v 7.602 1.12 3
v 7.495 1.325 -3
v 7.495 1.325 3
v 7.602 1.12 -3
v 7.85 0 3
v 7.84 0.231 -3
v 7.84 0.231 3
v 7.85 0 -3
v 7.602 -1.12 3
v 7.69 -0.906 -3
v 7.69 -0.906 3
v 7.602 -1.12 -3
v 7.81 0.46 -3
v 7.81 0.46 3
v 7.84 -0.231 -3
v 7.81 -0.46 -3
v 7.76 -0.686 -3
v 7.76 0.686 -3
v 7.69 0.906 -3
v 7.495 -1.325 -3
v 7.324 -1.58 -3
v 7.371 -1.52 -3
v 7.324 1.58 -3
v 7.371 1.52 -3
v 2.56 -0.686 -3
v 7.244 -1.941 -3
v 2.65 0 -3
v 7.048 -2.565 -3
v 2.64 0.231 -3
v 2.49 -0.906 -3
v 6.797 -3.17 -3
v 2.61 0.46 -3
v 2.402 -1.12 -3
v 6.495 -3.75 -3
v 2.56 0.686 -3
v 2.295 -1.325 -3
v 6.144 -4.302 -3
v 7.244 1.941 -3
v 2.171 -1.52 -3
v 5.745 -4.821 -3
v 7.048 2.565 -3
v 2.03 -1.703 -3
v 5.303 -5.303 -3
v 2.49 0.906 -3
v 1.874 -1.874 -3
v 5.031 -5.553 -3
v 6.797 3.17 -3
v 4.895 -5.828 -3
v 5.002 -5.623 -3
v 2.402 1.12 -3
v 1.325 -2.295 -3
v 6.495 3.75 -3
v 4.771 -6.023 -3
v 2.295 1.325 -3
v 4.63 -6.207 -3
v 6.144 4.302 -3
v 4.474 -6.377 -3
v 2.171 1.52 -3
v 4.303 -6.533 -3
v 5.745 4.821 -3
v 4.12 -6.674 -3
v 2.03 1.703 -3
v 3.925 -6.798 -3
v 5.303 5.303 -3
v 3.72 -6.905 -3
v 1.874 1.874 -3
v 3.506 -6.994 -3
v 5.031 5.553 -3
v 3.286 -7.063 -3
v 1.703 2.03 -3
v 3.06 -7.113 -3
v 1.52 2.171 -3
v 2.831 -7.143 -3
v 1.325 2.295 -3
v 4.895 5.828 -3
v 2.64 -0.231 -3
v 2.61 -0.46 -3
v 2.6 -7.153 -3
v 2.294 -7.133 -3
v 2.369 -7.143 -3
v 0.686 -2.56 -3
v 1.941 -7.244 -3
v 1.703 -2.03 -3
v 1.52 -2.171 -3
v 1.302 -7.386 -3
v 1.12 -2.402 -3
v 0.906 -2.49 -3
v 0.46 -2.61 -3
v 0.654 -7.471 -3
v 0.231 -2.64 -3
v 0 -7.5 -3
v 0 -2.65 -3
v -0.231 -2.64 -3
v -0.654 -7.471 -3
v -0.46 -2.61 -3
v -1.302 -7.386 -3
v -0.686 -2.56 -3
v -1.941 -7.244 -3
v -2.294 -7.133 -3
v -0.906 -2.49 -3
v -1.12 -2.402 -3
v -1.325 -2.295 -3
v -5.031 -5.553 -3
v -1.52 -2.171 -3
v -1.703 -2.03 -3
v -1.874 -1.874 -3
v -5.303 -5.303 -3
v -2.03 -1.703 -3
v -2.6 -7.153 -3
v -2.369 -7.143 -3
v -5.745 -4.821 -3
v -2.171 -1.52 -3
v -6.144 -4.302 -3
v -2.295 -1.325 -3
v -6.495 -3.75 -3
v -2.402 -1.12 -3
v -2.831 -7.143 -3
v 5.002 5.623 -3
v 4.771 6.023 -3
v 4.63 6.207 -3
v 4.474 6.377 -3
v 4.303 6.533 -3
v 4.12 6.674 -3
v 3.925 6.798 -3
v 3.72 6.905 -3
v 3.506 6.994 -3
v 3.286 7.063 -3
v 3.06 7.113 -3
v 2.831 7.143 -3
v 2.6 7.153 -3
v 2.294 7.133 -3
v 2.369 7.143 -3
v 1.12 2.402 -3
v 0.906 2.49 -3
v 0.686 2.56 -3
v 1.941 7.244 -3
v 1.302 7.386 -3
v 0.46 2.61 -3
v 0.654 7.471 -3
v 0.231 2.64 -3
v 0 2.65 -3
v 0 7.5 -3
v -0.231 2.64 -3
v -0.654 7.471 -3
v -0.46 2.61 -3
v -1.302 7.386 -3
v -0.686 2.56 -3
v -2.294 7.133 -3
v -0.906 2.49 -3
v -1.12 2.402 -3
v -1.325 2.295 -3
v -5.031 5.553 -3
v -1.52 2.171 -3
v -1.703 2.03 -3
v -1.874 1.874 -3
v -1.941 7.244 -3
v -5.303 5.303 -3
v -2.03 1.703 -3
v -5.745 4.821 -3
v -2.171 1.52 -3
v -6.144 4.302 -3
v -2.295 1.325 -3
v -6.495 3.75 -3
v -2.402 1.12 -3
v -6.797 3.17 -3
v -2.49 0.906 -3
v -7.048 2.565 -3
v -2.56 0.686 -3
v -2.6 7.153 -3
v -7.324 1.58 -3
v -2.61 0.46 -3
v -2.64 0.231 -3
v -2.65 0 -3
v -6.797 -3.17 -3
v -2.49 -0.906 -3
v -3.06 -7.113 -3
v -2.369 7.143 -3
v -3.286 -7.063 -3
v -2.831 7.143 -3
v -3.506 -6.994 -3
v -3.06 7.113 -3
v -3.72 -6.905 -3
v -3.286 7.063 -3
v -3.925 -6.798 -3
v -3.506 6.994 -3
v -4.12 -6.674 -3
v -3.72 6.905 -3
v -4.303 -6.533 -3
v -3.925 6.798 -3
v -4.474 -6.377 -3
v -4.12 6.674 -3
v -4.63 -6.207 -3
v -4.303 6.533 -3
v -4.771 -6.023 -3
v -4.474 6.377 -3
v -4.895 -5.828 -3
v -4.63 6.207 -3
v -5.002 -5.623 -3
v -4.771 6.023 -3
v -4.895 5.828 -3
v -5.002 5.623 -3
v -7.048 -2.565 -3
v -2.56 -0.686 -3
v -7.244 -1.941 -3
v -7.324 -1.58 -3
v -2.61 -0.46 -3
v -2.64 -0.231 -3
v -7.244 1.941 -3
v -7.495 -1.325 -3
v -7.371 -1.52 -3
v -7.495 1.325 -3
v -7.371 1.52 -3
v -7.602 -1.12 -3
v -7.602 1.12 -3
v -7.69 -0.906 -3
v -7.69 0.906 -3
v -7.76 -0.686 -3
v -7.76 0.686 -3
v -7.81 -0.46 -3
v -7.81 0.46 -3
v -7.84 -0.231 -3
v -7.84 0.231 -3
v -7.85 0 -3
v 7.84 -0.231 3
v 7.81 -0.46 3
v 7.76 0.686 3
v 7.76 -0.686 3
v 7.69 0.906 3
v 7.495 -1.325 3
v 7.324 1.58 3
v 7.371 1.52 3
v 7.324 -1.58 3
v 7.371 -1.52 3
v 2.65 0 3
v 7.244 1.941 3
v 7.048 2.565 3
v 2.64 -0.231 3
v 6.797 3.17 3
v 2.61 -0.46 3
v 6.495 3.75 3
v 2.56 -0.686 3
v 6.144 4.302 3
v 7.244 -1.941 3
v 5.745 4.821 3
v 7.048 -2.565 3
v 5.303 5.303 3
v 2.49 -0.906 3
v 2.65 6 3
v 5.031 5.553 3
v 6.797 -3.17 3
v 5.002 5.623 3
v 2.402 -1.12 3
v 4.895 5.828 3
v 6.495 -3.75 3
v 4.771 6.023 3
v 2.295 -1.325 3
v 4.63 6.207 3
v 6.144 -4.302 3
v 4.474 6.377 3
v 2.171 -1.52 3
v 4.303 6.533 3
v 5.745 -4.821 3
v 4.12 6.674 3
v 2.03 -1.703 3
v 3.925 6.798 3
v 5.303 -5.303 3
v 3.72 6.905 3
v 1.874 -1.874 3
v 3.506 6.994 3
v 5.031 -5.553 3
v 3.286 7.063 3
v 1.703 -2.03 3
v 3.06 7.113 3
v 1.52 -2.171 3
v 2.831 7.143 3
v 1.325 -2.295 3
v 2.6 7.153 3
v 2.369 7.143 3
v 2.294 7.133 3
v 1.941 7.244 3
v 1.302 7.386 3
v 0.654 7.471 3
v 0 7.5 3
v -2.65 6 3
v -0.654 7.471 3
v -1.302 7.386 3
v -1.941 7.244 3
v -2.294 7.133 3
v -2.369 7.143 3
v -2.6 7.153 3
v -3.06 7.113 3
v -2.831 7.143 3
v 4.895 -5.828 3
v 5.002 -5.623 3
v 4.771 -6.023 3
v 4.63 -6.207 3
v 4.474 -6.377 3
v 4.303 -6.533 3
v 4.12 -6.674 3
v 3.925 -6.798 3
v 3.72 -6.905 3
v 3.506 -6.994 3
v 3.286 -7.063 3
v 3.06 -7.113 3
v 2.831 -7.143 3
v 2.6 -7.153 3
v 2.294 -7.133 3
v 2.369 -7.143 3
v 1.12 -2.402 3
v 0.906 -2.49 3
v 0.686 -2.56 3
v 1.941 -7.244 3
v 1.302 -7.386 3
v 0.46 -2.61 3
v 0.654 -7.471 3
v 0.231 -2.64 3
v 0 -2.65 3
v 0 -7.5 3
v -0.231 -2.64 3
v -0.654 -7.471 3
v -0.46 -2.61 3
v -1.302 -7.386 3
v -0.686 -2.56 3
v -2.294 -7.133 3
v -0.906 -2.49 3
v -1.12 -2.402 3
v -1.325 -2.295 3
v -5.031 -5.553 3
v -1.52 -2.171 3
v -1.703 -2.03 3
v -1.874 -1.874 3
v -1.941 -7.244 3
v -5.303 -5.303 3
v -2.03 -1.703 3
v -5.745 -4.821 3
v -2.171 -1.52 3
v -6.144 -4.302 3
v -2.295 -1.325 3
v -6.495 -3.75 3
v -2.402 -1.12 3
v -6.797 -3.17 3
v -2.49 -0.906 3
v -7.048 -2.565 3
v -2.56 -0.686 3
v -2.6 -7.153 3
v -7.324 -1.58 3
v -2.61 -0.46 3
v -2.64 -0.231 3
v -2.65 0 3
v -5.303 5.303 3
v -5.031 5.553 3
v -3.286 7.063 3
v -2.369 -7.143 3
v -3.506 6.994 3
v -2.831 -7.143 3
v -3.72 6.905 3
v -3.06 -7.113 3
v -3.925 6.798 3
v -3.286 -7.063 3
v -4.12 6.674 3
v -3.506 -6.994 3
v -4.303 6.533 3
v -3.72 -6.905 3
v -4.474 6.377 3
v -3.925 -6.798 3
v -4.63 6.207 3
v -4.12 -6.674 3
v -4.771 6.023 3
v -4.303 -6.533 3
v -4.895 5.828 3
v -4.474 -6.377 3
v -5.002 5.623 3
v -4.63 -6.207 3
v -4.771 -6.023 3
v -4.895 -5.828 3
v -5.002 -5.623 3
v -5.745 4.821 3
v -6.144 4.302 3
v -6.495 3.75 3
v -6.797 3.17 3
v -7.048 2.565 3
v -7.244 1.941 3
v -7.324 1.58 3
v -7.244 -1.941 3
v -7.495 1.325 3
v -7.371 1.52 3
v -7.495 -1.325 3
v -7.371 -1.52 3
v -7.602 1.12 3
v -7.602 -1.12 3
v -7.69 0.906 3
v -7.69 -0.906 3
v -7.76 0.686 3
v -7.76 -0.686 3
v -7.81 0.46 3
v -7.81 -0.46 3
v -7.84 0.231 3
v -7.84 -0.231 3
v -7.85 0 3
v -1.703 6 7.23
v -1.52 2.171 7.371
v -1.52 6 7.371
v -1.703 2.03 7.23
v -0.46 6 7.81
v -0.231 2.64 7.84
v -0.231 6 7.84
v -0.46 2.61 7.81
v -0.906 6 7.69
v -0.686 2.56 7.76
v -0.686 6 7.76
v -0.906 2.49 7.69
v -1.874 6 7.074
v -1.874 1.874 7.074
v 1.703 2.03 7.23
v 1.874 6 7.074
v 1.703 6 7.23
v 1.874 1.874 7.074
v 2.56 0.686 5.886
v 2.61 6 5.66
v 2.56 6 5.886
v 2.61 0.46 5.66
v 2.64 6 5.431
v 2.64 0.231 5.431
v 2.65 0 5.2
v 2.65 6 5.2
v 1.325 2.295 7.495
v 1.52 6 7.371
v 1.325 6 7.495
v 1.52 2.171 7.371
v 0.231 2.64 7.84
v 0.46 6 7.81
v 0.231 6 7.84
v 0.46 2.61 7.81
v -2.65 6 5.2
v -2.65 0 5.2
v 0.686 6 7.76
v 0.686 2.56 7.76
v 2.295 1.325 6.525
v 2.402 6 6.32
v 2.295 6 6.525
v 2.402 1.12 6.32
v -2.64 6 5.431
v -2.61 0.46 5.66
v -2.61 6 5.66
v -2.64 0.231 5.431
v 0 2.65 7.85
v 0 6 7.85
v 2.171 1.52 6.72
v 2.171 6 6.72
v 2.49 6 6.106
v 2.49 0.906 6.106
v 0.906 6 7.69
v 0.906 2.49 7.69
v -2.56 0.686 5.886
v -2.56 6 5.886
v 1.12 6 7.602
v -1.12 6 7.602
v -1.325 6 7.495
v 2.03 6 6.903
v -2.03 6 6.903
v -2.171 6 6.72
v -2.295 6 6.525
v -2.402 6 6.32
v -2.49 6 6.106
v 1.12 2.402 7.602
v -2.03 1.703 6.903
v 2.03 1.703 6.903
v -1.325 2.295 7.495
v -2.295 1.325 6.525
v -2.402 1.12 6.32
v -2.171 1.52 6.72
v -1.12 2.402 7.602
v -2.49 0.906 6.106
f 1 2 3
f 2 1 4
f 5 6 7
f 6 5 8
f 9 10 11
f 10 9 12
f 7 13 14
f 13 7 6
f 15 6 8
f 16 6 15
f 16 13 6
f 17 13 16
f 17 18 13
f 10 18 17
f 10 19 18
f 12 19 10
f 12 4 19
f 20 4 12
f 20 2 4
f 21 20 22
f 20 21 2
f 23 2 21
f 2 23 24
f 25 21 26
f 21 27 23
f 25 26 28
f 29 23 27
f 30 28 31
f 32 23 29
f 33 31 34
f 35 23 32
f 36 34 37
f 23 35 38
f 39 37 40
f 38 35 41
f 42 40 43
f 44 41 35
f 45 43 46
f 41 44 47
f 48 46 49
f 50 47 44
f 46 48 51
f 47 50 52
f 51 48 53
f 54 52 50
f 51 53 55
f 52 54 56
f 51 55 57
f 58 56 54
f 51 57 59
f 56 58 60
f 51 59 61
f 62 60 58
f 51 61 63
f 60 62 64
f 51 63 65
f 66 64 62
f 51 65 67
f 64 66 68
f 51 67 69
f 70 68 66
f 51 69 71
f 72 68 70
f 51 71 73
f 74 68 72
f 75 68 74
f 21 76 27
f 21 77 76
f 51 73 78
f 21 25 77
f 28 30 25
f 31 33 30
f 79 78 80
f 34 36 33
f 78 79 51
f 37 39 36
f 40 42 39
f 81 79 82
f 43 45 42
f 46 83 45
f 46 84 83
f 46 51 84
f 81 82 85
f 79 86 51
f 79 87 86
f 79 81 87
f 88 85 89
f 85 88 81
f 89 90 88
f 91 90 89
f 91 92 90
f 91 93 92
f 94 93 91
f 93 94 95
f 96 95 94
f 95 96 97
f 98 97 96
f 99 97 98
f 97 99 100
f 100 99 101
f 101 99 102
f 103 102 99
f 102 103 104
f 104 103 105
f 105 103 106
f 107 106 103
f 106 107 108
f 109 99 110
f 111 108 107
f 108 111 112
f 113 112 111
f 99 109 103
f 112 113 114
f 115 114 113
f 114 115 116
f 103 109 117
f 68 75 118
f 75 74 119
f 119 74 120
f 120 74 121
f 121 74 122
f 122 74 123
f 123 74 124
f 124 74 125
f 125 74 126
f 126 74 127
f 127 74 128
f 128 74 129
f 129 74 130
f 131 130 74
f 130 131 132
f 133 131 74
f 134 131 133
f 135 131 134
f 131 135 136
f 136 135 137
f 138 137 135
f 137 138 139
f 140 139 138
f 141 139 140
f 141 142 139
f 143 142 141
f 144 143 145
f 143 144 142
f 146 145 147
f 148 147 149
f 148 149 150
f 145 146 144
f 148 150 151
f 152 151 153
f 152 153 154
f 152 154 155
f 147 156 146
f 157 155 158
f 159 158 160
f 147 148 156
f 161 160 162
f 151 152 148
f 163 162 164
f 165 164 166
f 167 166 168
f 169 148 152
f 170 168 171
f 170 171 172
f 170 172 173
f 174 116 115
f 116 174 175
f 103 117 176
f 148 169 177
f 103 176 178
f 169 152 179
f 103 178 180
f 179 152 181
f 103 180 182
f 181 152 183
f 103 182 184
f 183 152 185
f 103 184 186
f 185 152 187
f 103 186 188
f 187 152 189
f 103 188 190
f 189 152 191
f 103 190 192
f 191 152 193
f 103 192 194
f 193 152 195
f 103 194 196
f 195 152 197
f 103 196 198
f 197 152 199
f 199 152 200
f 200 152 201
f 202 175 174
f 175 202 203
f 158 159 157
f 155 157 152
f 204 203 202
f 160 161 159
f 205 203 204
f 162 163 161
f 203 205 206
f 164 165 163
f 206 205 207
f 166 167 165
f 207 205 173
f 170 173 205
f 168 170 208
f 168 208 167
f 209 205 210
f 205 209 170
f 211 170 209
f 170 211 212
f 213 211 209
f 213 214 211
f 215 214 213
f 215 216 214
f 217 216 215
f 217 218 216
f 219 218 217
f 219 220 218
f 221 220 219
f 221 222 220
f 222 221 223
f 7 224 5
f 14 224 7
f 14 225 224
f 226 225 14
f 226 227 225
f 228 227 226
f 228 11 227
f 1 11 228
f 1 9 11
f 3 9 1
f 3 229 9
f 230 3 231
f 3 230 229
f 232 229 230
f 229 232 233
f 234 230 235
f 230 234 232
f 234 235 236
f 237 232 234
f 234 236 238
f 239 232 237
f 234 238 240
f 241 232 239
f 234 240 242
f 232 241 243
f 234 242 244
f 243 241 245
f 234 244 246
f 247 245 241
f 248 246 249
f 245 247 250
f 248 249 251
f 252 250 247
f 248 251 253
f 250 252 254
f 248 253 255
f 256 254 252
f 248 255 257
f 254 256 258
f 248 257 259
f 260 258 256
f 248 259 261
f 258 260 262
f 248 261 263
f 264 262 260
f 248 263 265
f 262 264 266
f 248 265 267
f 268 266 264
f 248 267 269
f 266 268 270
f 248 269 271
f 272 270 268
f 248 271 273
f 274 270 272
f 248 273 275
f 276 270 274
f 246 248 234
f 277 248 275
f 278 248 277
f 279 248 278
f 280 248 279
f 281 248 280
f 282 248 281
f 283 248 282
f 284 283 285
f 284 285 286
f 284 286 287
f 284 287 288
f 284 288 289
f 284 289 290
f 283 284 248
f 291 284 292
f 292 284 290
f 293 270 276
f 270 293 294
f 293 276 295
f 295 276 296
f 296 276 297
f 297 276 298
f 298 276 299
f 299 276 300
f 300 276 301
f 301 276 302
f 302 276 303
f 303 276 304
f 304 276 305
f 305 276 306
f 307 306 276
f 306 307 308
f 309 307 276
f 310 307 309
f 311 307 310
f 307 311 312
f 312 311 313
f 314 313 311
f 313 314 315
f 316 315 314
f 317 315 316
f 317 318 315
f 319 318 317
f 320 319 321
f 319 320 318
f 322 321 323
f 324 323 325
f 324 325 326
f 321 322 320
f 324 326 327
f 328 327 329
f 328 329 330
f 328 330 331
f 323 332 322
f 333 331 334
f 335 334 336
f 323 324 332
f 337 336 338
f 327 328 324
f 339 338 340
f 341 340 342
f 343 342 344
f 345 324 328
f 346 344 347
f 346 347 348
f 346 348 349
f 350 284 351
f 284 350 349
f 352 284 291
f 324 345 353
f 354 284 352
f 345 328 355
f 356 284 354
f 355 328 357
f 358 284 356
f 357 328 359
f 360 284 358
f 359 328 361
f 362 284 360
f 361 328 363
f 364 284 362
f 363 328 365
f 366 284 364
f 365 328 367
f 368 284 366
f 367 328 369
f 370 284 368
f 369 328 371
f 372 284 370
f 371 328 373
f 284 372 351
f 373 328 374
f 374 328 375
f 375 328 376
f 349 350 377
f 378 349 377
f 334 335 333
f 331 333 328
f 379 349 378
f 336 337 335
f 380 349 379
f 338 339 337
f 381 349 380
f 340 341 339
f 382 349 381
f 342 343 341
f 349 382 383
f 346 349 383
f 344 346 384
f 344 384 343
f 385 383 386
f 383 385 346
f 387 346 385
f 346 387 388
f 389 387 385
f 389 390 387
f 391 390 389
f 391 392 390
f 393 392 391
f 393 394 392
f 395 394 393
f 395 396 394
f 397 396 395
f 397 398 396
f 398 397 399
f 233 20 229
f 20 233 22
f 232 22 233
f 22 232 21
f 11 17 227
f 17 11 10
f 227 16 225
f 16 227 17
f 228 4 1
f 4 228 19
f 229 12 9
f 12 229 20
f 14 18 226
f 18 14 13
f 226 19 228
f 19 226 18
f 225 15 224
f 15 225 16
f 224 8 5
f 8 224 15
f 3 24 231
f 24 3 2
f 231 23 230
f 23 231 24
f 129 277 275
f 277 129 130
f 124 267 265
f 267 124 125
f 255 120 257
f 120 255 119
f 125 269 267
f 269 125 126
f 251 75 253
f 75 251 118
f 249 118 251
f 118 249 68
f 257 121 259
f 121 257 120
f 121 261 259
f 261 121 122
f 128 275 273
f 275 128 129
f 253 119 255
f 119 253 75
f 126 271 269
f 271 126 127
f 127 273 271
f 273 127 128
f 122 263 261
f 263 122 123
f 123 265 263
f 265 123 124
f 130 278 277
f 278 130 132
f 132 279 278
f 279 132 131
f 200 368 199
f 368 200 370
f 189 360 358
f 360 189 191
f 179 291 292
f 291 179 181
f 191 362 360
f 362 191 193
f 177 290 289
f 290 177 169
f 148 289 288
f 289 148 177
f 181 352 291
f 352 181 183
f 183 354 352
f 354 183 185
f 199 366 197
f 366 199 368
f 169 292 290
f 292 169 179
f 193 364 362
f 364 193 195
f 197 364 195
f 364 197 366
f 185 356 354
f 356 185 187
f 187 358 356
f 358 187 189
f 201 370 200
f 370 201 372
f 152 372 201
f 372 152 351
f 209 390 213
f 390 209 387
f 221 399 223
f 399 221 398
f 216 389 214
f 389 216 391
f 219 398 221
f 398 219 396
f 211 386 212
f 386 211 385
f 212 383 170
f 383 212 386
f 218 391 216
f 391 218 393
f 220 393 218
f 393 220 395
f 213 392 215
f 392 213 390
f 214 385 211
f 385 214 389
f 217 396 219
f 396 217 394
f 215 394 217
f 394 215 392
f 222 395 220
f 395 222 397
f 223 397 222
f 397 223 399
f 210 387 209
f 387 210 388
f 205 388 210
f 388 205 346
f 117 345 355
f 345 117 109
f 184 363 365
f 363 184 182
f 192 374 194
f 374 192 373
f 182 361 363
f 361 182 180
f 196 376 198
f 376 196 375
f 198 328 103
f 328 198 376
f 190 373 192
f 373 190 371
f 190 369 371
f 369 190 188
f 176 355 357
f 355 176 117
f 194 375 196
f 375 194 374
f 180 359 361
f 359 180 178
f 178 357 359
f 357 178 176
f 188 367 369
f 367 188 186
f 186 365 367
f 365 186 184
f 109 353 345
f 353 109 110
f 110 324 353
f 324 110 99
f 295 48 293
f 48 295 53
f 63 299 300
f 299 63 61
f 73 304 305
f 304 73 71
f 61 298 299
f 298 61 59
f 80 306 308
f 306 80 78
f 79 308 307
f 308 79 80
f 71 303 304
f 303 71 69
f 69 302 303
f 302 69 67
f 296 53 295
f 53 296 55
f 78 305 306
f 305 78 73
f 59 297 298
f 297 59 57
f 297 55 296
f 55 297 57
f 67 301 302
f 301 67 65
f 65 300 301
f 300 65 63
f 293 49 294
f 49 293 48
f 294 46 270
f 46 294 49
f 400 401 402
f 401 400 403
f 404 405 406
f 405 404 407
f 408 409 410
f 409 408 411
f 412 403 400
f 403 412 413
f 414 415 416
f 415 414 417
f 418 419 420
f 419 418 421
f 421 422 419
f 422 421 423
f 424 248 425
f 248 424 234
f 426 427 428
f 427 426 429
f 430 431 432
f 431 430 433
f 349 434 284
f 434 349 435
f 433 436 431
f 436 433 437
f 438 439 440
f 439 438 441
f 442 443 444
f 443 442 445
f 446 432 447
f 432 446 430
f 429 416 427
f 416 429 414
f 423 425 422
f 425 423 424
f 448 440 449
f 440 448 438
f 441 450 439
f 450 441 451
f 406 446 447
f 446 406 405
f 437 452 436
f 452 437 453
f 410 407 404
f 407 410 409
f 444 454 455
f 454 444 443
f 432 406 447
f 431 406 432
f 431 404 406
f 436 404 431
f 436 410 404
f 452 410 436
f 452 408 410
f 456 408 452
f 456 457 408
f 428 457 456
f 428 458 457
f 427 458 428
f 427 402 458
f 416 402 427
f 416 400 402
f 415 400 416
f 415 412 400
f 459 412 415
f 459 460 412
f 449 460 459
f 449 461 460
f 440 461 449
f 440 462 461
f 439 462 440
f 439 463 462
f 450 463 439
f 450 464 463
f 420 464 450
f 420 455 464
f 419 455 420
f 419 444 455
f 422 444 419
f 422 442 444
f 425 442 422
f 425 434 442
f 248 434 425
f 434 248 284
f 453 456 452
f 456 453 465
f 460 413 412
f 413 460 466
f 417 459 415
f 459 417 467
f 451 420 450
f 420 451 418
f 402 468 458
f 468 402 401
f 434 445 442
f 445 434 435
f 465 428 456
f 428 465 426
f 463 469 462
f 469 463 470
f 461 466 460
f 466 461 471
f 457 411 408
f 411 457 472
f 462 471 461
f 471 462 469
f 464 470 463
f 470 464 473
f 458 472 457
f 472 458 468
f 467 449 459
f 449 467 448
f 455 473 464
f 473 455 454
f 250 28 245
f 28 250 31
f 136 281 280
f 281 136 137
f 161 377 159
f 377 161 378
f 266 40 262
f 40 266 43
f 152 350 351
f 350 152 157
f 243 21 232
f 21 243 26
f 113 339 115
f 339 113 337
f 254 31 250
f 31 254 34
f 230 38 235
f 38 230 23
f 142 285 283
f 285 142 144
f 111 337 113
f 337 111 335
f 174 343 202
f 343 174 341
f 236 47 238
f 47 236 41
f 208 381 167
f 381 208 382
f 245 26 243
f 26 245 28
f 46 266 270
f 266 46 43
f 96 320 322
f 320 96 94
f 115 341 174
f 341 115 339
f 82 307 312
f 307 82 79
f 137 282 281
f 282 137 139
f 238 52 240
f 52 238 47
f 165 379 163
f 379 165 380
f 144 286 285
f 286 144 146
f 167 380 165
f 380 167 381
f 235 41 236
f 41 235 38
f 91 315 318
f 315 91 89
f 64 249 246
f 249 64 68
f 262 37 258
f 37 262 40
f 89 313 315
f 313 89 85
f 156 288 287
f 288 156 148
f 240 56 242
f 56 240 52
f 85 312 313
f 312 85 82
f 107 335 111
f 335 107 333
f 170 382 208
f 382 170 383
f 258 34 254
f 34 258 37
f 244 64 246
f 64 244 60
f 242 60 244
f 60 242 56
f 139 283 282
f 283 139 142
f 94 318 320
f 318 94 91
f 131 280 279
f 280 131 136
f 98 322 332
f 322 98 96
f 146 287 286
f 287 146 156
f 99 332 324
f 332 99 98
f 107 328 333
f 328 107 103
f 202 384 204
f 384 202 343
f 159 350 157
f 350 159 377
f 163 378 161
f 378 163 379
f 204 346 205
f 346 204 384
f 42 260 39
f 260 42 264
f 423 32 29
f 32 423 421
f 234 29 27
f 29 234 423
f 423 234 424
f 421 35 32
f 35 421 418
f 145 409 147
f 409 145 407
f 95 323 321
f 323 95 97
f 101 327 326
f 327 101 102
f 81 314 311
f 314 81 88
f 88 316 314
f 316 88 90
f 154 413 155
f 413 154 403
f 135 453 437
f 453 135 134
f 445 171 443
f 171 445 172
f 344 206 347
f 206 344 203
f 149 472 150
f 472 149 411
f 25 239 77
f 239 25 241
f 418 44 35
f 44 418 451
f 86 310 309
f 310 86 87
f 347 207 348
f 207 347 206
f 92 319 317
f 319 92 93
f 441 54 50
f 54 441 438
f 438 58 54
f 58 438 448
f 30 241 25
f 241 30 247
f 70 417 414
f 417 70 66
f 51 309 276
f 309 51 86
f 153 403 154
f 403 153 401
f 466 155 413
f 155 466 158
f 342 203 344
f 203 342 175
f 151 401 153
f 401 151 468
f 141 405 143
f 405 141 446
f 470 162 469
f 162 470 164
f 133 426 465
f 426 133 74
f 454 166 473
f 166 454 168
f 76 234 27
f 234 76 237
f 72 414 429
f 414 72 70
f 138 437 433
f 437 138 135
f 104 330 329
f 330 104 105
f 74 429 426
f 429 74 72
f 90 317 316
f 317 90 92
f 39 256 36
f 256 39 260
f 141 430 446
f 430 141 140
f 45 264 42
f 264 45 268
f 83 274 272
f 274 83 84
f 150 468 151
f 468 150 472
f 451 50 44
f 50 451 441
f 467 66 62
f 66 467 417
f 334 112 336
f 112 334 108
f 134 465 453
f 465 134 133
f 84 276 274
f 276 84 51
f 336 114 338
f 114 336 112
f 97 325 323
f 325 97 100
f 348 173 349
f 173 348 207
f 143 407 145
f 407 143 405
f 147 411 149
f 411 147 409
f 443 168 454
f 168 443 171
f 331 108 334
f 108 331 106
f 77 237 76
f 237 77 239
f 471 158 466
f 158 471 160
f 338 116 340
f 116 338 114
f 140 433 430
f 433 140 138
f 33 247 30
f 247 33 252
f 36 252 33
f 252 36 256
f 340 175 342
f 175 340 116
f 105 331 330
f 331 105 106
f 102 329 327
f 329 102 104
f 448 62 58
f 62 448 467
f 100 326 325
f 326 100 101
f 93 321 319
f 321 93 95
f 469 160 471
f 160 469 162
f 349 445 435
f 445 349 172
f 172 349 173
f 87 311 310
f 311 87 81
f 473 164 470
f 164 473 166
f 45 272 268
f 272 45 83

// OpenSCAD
// K'NEX Blue 7-Way 3D Connector (6 planar at 60° + 1 upward)
$fn = 72;

hub_r = 7.5;
hub_h = 6.0;
arm_w = 5.3;
arm_h = 6.0;
arm_len = 12.7;
hole_r = 2.65;
slot_w = 1.2;

module arm() {
    difference() {
        hull() {
            cylinder(h=arm_h, r=arm_w/2, center=true);
            translate([arm_len - hub_r, 0, 0])
                cylinder(h=arm_h, r=arm_w/2, center=true);
        }
        translate([arm_len, 0, 0])
            cylinder(h=arm_h+2, r=hole_r, center=true);
        translate([arm_len, 0, 0]) {
            translate([0, 0, arm_h/2])
                cube([slot_w, hole_r*2+1, 2], center=true);
            translate([0, 0, -arm_h/2])
                cube([slot_w, hole_r*2+1, 2], center=true);
        }
    }
}

module connector_7way_3d() {
    difference() {
        union() {
            // Central hub (slightly taller to accommodate upward arm)
            cylinder(h=hub_h, r=hub_r, center=true);
            
            // 6 planar arms at 60° spacing
            for (a = [0, 60, 120, 180, 240, 300]) {
                rotate([0, 0, a]) arm();
            }
            
            // Upward arm
            rotate([90, 0, 0])
                translate([0, 0, -hub_h/2])
                    difference() {
                        hull() {
                            cylinder(h=arm_h, r=arm_w/2, center=true);
                            translate([0, arm_len - hub_r, 0])
                                cylinder(h=arm_h, r=arm_w/2, center=true);
                        }
                        translate([0, arm_len, 0])
                            cylinder(h=arm_h+2, r=hole_r, center=true);
                    }
        }
        // Center axle hole (through full height including upward arm)
        cylinder(h=arm_len*2+4, r=hole_r, center=true);
    }
}

connector_7way_3d();
